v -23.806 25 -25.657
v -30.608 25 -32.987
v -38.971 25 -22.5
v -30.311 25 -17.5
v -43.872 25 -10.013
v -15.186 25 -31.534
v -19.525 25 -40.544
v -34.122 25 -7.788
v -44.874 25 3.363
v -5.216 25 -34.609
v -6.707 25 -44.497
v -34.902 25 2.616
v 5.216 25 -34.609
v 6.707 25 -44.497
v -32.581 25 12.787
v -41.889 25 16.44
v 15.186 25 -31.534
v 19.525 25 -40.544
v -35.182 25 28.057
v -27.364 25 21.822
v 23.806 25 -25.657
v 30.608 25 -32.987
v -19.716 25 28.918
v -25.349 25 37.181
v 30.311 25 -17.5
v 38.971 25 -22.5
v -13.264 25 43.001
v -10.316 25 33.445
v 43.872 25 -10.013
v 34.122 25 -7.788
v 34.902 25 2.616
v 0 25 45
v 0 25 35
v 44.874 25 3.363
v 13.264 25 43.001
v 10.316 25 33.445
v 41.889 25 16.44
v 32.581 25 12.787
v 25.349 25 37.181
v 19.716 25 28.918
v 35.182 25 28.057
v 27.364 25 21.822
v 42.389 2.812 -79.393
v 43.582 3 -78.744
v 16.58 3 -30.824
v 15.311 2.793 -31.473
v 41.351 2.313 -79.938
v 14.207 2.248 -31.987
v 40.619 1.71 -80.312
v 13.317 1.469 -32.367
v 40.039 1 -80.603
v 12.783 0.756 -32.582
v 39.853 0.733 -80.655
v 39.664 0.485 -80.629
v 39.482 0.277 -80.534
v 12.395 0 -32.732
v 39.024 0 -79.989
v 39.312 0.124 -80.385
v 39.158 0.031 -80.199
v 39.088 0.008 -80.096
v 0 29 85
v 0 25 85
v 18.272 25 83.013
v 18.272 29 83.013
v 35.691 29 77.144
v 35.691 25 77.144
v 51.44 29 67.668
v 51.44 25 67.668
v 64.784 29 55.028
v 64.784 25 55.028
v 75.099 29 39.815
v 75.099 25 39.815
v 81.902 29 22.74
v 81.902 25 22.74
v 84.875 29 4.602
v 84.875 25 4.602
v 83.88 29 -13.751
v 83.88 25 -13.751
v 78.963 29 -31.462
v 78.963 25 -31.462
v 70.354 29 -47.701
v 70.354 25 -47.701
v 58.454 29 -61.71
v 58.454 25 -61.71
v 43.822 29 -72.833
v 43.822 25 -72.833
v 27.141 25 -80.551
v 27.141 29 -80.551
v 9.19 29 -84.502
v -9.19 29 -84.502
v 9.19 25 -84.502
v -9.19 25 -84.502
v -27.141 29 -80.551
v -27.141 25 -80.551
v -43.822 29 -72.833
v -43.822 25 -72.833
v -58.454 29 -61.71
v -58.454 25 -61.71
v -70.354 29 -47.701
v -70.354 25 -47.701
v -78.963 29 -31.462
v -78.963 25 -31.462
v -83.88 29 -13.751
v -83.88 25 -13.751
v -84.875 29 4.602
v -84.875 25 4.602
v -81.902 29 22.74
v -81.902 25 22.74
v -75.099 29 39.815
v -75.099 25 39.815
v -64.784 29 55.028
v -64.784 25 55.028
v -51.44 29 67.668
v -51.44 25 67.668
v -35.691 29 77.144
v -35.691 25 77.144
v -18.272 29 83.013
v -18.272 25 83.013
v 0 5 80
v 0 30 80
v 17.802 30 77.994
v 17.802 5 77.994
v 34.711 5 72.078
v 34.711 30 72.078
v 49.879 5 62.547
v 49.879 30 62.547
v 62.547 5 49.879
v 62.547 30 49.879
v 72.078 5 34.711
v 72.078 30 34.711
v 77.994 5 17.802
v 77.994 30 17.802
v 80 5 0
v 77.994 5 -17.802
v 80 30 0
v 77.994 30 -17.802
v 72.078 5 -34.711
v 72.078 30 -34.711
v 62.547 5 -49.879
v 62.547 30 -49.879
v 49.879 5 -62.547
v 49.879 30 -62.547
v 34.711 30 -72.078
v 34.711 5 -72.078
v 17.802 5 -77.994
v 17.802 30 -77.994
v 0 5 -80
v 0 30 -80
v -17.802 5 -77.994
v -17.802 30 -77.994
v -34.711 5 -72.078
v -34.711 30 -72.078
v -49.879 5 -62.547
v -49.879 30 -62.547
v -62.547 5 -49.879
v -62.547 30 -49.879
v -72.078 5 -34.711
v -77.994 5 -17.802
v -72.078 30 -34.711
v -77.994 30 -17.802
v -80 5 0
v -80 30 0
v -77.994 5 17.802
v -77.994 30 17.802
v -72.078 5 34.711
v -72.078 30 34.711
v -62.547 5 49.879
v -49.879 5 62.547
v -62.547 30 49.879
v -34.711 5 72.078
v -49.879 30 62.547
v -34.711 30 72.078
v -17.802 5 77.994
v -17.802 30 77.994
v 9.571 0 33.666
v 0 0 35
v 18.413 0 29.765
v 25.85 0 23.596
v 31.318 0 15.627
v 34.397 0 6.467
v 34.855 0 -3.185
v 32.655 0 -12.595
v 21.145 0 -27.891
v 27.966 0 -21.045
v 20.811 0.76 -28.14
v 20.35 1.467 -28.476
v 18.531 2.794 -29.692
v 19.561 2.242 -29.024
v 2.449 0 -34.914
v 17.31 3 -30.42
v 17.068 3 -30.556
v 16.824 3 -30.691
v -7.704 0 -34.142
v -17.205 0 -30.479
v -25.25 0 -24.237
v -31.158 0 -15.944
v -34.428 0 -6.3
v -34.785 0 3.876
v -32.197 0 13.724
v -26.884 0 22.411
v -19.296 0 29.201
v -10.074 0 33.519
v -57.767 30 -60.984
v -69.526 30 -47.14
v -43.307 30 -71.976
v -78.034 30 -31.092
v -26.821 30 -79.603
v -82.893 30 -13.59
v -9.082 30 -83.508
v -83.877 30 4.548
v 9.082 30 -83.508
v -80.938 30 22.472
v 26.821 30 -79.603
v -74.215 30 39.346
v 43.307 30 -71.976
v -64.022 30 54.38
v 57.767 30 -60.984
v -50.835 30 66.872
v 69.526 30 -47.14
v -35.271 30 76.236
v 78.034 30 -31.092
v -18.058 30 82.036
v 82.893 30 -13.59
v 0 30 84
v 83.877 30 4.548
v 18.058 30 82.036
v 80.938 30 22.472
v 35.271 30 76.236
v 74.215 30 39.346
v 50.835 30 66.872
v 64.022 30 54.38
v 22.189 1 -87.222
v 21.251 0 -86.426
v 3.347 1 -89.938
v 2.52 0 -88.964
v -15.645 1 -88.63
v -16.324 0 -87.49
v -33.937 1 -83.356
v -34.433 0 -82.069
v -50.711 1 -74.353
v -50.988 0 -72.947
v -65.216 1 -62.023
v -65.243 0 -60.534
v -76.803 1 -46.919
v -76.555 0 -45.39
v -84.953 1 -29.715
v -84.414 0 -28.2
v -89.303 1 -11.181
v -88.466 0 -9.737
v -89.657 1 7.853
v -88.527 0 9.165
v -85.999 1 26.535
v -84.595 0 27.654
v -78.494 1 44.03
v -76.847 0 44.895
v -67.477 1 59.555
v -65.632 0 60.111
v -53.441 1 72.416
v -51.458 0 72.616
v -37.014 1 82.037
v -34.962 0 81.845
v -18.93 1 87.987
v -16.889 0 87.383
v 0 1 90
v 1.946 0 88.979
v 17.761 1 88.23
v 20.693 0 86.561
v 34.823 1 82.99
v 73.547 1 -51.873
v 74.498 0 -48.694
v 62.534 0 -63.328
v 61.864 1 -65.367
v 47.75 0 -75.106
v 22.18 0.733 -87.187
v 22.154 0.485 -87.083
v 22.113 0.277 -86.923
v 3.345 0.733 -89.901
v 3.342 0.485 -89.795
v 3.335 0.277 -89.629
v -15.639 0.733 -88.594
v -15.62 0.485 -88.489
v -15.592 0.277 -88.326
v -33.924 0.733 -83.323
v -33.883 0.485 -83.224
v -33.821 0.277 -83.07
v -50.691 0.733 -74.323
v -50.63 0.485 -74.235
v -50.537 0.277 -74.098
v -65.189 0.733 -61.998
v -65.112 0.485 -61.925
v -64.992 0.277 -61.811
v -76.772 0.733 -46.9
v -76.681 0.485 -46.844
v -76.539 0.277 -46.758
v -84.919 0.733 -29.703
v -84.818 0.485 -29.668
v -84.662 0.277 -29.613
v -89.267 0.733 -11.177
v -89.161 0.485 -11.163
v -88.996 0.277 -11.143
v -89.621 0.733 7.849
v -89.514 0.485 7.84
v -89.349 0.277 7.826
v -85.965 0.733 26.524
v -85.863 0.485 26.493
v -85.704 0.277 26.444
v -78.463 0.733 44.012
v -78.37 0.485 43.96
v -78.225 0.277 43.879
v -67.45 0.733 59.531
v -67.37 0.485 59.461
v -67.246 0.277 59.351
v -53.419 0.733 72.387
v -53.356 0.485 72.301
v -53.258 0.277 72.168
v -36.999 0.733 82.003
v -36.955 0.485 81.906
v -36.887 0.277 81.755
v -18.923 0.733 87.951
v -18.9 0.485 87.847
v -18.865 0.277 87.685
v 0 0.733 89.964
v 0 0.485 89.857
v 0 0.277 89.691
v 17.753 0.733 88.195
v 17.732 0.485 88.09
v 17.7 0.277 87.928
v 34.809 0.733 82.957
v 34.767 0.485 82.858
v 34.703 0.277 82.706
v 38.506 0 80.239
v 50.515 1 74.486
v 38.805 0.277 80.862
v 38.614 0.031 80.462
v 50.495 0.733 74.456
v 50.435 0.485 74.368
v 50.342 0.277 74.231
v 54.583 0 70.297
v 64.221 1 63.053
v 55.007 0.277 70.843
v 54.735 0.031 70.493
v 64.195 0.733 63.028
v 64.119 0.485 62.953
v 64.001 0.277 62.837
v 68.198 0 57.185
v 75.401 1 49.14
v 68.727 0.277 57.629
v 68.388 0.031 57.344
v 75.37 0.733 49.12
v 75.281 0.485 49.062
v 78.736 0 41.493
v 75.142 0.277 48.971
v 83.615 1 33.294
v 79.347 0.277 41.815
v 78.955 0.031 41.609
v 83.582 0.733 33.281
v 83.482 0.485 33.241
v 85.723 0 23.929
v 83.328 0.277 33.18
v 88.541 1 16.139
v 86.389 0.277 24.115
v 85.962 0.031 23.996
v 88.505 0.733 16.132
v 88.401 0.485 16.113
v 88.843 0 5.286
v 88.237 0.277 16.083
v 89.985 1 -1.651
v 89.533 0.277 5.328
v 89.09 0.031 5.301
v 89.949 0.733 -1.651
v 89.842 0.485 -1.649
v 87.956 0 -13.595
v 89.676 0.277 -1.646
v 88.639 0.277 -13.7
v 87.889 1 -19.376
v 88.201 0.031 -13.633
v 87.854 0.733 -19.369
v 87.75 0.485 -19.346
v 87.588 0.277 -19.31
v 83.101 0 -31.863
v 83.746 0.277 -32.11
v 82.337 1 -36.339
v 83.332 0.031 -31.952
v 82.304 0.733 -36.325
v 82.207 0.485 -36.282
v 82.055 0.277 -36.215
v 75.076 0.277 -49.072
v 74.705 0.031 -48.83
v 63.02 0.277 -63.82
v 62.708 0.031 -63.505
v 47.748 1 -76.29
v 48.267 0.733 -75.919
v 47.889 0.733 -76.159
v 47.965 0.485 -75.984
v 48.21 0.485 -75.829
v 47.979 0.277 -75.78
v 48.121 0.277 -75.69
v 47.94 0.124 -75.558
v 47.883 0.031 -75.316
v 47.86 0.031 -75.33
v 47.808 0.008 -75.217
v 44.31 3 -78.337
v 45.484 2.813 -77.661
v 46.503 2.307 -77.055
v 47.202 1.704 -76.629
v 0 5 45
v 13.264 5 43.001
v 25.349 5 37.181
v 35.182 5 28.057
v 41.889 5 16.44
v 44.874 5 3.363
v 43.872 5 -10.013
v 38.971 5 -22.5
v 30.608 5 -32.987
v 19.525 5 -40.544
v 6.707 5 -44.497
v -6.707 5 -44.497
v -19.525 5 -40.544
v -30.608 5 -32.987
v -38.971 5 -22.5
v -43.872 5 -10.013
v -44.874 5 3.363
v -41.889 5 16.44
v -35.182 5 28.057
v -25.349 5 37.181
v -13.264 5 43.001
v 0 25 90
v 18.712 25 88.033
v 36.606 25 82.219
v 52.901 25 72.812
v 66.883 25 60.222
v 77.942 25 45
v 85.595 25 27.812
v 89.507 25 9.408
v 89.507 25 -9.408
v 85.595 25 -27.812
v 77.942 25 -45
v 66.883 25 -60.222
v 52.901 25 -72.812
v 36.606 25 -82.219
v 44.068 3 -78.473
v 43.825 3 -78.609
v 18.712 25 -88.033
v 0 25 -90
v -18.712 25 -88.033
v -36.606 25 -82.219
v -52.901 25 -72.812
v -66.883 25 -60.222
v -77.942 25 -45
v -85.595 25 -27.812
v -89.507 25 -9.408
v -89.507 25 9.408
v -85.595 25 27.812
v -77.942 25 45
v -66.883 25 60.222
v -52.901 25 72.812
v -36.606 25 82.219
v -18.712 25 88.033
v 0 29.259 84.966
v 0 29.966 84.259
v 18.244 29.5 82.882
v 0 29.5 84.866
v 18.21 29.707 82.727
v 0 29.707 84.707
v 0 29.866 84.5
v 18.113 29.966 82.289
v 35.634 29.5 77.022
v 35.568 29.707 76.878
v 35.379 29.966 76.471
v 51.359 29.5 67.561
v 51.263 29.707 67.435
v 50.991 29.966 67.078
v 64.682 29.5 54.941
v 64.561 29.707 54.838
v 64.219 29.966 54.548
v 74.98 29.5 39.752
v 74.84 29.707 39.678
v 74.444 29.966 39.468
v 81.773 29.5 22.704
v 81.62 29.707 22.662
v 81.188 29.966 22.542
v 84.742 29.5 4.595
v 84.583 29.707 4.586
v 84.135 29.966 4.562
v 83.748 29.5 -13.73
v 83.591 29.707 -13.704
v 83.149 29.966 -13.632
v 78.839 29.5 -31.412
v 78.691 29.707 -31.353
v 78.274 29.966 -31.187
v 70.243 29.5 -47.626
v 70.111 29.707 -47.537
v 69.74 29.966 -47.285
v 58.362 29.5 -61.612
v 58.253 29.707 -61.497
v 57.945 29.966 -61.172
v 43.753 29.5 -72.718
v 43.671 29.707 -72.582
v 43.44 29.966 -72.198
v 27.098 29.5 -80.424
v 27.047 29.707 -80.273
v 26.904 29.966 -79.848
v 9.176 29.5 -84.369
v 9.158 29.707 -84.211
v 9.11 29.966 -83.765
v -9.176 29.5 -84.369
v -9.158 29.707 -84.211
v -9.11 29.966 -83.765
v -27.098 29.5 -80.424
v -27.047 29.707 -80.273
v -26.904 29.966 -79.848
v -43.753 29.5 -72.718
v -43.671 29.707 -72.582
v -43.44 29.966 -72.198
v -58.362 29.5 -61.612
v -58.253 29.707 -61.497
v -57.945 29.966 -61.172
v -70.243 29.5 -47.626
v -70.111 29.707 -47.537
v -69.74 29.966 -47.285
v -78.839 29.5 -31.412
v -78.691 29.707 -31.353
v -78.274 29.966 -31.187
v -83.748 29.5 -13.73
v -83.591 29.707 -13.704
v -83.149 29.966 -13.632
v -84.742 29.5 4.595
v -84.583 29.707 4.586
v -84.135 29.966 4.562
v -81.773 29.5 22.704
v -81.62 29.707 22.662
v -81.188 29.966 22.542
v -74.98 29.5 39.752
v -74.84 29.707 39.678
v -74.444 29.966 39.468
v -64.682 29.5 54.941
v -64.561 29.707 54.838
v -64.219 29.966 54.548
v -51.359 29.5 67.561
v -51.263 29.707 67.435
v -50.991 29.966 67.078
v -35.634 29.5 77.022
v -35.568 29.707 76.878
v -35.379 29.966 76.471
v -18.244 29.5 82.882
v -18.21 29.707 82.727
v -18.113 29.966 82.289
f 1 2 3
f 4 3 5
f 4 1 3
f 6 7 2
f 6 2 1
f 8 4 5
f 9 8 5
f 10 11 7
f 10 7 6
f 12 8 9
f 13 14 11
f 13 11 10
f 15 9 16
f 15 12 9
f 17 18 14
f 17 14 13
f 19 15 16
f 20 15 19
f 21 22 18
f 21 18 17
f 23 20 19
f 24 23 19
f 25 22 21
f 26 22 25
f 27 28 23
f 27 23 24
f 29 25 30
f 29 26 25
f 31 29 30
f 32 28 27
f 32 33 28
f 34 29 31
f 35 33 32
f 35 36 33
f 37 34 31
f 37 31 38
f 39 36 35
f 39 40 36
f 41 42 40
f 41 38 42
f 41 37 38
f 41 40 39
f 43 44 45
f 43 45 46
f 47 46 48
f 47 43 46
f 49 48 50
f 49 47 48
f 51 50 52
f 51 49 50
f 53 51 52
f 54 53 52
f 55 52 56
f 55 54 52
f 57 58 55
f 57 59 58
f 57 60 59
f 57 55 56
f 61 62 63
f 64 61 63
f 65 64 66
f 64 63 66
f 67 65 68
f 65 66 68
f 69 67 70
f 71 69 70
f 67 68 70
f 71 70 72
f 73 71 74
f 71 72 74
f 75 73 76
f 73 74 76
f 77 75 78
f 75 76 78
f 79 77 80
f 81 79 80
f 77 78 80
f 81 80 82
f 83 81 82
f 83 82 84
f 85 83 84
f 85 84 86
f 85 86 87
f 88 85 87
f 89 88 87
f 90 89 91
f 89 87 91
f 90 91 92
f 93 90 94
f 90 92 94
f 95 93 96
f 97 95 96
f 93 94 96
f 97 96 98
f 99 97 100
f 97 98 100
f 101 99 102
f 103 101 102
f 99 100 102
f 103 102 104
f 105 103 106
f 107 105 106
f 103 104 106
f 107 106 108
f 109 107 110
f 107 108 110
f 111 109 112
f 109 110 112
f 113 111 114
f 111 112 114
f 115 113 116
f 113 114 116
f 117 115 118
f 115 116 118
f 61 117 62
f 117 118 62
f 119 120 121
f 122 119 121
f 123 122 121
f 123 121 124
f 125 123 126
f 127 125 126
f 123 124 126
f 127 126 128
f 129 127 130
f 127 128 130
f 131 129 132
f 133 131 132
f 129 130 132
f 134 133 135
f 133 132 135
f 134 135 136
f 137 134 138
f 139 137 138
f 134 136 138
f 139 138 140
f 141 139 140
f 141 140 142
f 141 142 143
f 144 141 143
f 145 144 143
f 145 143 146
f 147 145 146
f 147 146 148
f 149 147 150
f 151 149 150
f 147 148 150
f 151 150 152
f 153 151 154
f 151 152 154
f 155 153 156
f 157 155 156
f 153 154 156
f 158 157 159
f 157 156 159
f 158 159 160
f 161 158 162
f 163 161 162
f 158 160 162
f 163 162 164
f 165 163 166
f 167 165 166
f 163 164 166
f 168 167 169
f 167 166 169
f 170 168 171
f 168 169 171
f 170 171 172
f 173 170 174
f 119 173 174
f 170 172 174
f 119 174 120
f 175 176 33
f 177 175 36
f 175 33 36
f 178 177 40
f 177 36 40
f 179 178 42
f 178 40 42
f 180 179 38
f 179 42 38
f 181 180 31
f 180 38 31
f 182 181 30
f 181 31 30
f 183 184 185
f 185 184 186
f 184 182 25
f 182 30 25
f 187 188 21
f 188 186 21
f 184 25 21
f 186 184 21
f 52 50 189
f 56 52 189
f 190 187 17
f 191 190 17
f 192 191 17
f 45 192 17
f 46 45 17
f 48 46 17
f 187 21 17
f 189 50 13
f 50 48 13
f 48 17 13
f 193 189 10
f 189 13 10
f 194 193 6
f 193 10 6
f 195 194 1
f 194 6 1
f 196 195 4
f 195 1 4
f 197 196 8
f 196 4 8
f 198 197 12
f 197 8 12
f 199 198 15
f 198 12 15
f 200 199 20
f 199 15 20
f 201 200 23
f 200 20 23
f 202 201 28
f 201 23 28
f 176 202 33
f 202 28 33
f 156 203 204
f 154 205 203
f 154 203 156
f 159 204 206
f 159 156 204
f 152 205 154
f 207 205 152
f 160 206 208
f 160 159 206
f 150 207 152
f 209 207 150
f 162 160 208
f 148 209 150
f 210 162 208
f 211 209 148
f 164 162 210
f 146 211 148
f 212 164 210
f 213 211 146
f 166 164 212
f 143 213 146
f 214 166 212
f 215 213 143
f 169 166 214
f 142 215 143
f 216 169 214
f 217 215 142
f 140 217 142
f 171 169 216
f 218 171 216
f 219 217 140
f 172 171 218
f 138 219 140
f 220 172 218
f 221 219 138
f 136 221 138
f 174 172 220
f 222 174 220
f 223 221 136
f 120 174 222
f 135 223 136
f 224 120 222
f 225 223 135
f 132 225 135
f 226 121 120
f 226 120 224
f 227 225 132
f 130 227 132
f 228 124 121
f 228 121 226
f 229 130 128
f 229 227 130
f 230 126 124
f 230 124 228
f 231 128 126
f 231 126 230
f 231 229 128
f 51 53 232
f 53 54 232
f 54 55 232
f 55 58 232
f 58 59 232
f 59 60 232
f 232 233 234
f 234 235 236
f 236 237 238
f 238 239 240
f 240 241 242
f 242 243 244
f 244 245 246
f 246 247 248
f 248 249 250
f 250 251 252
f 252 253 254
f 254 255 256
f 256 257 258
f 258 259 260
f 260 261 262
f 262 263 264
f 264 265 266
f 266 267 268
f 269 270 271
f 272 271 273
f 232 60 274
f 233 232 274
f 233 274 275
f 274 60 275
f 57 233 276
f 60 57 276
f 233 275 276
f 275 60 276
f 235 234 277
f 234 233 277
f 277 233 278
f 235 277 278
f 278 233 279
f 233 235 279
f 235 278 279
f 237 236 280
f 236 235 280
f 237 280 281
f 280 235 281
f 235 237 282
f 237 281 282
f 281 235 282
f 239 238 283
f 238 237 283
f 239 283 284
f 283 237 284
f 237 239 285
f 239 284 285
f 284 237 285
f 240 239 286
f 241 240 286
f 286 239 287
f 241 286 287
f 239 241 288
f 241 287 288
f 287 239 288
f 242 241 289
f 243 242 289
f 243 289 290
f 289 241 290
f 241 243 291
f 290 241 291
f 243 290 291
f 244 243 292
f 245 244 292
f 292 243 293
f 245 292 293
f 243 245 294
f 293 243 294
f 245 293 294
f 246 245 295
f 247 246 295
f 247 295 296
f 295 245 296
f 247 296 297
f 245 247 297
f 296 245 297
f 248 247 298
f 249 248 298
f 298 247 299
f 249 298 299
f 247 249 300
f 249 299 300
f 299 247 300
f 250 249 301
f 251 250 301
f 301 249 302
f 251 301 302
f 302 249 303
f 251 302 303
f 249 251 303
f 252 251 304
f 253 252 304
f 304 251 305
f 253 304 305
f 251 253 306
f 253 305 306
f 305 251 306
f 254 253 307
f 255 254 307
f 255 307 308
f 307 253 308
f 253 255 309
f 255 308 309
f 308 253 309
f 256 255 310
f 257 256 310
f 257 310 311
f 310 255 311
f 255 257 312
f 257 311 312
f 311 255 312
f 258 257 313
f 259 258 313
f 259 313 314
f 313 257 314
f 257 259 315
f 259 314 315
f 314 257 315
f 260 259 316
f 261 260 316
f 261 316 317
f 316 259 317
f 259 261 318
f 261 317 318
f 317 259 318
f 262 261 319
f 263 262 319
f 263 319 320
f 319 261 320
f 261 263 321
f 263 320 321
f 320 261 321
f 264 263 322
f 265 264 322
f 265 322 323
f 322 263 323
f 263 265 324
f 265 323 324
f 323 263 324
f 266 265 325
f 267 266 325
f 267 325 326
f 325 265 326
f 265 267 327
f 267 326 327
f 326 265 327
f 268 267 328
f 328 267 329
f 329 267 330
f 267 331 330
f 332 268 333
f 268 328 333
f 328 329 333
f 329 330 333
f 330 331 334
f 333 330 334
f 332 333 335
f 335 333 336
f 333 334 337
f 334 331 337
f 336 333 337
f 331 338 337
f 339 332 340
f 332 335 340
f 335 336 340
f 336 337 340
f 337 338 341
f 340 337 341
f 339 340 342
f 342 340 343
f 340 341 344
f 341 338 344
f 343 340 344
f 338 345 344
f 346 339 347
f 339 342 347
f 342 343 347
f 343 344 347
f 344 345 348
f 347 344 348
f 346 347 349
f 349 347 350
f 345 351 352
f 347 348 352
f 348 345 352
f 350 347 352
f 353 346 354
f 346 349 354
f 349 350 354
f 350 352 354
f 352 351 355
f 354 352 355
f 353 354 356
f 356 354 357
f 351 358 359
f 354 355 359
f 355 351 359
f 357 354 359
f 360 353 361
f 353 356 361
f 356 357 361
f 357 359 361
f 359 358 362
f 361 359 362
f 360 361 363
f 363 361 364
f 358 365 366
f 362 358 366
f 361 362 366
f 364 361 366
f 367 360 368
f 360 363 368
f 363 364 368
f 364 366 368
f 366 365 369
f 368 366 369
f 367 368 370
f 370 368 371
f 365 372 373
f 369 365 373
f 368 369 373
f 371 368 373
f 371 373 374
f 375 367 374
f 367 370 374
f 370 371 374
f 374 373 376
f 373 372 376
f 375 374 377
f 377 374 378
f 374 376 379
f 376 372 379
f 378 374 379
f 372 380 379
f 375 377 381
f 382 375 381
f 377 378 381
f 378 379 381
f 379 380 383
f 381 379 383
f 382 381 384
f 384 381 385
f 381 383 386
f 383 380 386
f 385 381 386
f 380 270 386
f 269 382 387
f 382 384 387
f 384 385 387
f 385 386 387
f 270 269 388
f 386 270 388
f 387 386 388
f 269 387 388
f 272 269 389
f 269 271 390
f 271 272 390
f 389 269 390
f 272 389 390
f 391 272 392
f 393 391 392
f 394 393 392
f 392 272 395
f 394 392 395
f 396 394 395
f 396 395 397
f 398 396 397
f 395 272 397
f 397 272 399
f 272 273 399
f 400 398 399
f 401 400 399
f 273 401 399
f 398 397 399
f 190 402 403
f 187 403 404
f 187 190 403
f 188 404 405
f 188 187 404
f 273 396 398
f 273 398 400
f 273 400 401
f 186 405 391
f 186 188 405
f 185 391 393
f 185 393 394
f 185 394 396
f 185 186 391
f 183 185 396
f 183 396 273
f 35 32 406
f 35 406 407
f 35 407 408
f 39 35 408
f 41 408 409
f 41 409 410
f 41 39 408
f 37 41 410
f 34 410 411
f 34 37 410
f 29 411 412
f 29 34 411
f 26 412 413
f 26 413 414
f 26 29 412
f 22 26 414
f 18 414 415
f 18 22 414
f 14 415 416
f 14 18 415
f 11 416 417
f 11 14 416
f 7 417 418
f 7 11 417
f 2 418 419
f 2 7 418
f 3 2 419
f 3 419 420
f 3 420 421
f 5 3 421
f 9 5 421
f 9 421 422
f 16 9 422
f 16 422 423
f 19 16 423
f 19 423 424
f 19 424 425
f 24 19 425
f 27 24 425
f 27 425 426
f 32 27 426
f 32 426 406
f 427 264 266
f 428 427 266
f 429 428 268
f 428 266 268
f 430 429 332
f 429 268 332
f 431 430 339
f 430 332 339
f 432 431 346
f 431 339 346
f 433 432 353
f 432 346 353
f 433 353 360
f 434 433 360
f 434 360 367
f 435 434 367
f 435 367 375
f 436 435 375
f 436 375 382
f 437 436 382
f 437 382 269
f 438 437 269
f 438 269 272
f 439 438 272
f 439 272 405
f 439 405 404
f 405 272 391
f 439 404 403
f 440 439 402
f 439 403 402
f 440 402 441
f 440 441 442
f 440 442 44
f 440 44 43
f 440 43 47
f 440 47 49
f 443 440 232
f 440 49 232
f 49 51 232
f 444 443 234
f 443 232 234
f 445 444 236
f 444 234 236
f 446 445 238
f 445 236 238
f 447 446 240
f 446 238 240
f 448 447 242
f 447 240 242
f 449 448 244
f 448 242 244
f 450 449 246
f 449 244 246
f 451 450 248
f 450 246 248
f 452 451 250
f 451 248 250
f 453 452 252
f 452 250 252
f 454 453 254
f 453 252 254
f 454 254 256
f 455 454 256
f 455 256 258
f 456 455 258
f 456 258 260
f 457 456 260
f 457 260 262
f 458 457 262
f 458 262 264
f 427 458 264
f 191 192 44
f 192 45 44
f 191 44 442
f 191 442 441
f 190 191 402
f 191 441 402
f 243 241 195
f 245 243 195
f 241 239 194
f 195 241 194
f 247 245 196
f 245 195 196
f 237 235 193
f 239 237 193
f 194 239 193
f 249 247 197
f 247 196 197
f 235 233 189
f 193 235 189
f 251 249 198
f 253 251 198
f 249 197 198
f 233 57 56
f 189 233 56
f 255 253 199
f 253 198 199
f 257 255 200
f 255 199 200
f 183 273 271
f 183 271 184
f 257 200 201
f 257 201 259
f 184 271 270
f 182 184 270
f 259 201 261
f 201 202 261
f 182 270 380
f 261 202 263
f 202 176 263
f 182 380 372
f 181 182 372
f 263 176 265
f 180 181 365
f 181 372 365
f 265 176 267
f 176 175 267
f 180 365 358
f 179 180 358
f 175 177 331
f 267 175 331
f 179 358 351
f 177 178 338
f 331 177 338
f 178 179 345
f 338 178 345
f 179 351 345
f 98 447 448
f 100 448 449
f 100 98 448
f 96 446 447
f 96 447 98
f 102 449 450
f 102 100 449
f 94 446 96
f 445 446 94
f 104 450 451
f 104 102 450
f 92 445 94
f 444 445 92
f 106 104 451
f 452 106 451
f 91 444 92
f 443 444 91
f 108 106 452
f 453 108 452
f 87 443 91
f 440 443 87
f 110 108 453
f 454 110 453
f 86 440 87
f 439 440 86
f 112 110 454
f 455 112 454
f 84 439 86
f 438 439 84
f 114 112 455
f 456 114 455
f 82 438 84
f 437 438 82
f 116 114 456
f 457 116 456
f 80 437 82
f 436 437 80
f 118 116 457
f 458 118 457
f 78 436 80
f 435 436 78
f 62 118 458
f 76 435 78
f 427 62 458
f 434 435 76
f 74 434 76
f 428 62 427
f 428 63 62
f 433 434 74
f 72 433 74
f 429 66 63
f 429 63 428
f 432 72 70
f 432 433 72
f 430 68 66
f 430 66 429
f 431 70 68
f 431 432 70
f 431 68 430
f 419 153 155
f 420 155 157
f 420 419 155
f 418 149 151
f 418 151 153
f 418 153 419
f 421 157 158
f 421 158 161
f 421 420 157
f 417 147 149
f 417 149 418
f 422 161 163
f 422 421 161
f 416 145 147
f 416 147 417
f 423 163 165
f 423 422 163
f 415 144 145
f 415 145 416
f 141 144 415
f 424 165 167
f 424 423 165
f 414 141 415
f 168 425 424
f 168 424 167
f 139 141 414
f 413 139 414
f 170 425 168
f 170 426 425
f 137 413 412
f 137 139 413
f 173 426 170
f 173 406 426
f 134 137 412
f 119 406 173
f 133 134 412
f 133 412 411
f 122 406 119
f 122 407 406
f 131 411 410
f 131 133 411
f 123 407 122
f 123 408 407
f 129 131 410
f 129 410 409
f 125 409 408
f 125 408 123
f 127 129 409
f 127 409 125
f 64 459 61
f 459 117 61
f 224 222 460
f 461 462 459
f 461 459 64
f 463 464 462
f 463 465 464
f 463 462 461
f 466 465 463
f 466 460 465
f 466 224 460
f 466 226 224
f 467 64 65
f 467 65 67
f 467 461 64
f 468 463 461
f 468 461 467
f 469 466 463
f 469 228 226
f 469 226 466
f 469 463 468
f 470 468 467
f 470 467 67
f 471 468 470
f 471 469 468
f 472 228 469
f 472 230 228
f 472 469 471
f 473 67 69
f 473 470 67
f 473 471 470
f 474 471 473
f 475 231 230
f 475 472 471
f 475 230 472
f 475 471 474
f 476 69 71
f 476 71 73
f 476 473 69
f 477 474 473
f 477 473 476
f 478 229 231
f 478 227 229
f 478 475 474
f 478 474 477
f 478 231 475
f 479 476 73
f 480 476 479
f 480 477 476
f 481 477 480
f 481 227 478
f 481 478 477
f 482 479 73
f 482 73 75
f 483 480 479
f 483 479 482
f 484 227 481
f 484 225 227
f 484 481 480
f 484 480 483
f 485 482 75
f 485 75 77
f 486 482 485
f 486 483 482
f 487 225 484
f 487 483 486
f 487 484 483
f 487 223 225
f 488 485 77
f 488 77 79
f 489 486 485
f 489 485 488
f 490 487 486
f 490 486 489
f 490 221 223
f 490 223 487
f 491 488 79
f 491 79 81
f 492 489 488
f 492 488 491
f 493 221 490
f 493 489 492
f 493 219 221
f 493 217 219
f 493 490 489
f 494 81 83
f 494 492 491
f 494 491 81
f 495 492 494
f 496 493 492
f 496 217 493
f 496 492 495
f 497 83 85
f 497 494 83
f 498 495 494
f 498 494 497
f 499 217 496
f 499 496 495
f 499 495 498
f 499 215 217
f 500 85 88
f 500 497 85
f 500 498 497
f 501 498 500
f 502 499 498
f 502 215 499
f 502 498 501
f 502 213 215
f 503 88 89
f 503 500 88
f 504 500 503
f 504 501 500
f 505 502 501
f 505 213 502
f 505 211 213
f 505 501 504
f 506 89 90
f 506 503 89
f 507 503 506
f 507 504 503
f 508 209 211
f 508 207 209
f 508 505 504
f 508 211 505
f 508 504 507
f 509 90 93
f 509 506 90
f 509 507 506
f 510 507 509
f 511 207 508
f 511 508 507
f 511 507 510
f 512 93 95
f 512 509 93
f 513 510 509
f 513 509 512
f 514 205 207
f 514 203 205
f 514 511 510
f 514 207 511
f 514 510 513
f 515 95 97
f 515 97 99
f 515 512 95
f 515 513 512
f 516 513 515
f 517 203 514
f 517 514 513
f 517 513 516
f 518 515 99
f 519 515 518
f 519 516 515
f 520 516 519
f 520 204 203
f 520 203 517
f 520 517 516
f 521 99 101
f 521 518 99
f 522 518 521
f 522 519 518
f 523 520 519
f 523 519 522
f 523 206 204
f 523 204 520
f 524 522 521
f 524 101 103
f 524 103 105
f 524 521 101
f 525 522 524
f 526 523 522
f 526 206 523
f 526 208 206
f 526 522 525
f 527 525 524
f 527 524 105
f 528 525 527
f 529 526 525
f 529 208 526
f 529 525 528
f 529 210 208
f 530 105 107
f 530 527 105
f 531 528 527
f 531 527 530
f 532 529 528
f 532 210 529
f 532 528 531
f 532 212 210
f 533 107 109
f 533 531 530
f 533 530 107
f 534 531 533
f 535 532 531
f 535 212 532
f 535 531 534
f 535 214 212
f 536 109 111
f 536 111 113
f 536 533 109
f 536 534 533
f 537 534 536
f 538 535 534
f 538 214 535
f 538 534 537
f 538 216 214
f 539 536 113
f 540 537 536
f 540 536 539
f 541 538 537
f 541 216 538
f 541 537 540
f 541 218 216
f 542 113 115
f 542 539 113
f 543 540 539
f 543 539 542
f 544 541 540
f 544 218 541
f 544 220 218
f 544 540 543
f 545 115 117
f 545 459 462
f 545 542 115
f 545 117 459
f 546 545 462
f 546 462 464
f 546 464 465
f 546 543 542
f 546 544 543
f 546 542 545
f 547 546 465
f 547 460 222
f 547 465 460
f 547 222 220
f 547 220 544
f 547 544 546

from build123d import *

# Parameters (mm, degrees)
SKETCH1_R           = 90
BOSS_EXTRUDE1_DEPTH = 30
SKETCH2_R           = 80
SKETCH2_R_2         = 45
CUT_EXTRUDE2_DEPTH  = 25
SKETCH3_R           = 35
CUT_EXTRUDE3_DEPTH  = 30
CUT_EXTRUDE6_START  = -5
SKETCH4_R           = 90
SKETCH4_R_2         = 85
CUT_EXTRUDE6_DEPTH  = 5
CUT_EXTRUDE7_DEPTH  = 3
FILLET4_R           = 5
FILLET5_R           = 5
FILLET7_R           = 1
SKETCH8_R           = 45
CUT_EXTRUDE8_DEPTH  = 5


with BuildPart() as part:
    # Sketch1 → Boss-Extrude1 (new body)
    with BuildSketch(Plane(origin=(0, 0, 0), x_dir=(1, 0, 0), z_dir=(0, 1, 0))):
        with Locations(Location((0, 0, 0), (0, 0, 270))):
            Circle(SKETCH1_R)
    extrude(amount=BOSS_EXTRUDE1_DEPTH)

    # Sketch2 → Cut-Extrude2 (cut)
    with BuildSketch(Plane(origin=(0, 30, 0), x_dir=(1, 0, 0), z_dir=(0, 1, 0))):
        with Locations(Location((0, 0, 0), (0, 0, 270))):
            Circle(SKETCH2_R)
        with Locations(Location((0, 0, 0), (0, 0, 270))):
            Circle(SKETCH2_R_2, mode=Mode.SUBTRACT)
    extrude(amount=-CUT_EXTRUDE2_DEPTH, mode=Mode.SUBTRACT)

    # Sketch3 → Cut-Extrude3 (cut)
    with BuildSketch(Plane(origin=(0, 30, 0), x_dir=(1, 0, 0), z_dir=(0, 1, 0))):
        with Locations(Location((0, 0, 0), (0, 0, 270))):
            Circle(SKETCH3_R)
    extrude(amount=-CUT_EXTRUDE3_DEPTH, mode=Mode.SUBTRACT)

    # Sketch4 → Cut-Extrude6 (cut)
    with BuildSketch(Plane(origin=(0, 30, 0), x_dir=(1, 0, 0), z_dir=(0, 1, 0)).offset(CUT_EXTRUDE6_START)):
        with Locations(Location((0, 0, 0), (0, 0, 270))):
            Circle(SKETCH4_R)
        with Locations(Location((0, 0, 0), (0, 0, 270))):
            Circle(SKETCH4_R_2, mode=Mode.SUBTRACT)
    extrude(amount=CUT_EXTRUDE6_DEPTH, mode=Mode.SUBTRACT)

    # Sketch7 → Cut-Extrude7 (cut)
    with BuildSketch(Plane(origin=(0, 0, 0), x_dir=(-1, 0, 0), z_dir=(0, -1, 0))):
        Polygon((-43.33470773, 87.639434023), (16.290699143, -18.176389433), (7.60290089, -23.128375045), (-52.007029161, 82.661204336), align=None)
    extrude(amount=-CUT_EXTRUDE7_DEPTH, mode=Mode.SUBTRACT)

    # Fillet4
    # the kernel refuses this fillet: 5 mm, written as the material it adds along each edge
    with BuildSketch(Plane(origin=(15.521035458, 3, -17.909611373), x_dir=(0, -1, 0), z_dir=(0.490907288805725, 0, -0.871211819133219))) as fillet4_piece_1_section:
        with BuildLine():
            CenterArc((5, 4.582575695), FILLET4_R, 180, 66.421821522)
            Line((0, 4.582575695), (-0.1, 4.582575695))
            Line((-0.1, 4.582575695), (-0.1, 0))
            Line((-0.1, 0), (0, -0.1))
            ThreePointArc((0, -0.1), (1.5, -0.1), (2.96, -0.091651514))
            Line((2.96, -0.091651514), (3, 0))
        make_face()
    fillet4_piece_1 = extrude(amount=78.109596927, mode=Mode.PRIVATE)
    fillet4_piece_1 = fillet4_piece_1 & Plane(origin=(0, 3, 0), x_dir=(0, 0, 1), z_dir=(0, -1, 0)) * Cylinder(90, 175, mode=Mode.PRIVATE)
    fillet4_piece_1 = fillet4_piece_1 - Plane(origin=(0, 3, 0), x_dir=(0, 0, 1), z_dir=(0, 1, 0)) * Cylinder(35, 175, mode=Mode.PRIVATE)
    add(fillet4_piece_1)

    # Fillet5
    # the kernel refuses this fillet: 5 mm, written as the material it adds along each edge
    with BuildSketch(Plane(origin=(45.139410265, 3, -90.842197657), x_dir=(0.8712093933197586, 0, 0.4909115938653498), z_dir=(-0.4909115938653499, 0, 0.8712093933197586))) as fillet5_piece_1_section:
        with BuildLine():
            CenterArc((4.582575695, -5), FILLET5_R, 90, 66.421821522)
            Line((0, -3), (-0.091651514, -2.96))
            ThreePointArc((-0.091651514, -2.96), (-0.1, -1.5), (-0.1, 0))
            Line((-0.1, 0), (0, 0.1))
            Line((0, 0.1), (4.582575695, 0.1))
            Line((4.582575695, 0.1), (4.582575695, 0))
        make_face()
    fillet5_piece_1 = extrude(amount=78.15744592, mode=Mode.PRIVATE)
    fillet5_piece_1 = fillet5_piece_1 - Plane(origin=(0, 3, 0), x_dir=(0, 0, 1), z_dir=(0, 1, 0)) * Cylinder(35, 175, mode=Mode.PRIVATE)
    fillet5_piece_1 = fillet5_piece_1 & Plane(origin=(0, 3, 0), x_dir=(0, 0, 1), z_dir=(0, -1, 0)) * Cylinder(90, 175, mode=Mode.PRIVATE)
    add(fillet5_piece_1)

    # Fillet6: read off the stored shape, not the designer's step
    # Fillet6 outline → Fillet6 (revolve, cut)
    with BuildSketch(Plane.XY):
        with BuildLine():
            ThreePointArc((90, 1), (89.707106781, 0.292893219), (89, 0))
            Line((89, 0), (90, 0))
            Line((90, 0), (90, 1))
        make_face()
    revolve(axis=Axis((0, 0, 0), (0, 1, 0)), mode=Mode.SUBTRACT)

    # Fillet7
    fillet7_edges = [part.edges().sort_by_distance(p)[0] for p in [
        (0, 30, -85),
    ]]
    fillet(fillet7_edges, radius=FILLET7_R)

    # Sketch8 → Cut-Extrude8 (cut)
    with BuildSketch(Plane(origin=(0, 30, 0), x_dir=(1, 0, 0), z_dir=(0, 1, 0))):
        with Locations(Location((0, 0, 0), (0, 0, 270))):
            Circle(SKETCH8_R)
    extrude(amount=-CUT_EXTRUDE8_DEPTH, mode=Mode.SUBTRACT)


solid = part.part
